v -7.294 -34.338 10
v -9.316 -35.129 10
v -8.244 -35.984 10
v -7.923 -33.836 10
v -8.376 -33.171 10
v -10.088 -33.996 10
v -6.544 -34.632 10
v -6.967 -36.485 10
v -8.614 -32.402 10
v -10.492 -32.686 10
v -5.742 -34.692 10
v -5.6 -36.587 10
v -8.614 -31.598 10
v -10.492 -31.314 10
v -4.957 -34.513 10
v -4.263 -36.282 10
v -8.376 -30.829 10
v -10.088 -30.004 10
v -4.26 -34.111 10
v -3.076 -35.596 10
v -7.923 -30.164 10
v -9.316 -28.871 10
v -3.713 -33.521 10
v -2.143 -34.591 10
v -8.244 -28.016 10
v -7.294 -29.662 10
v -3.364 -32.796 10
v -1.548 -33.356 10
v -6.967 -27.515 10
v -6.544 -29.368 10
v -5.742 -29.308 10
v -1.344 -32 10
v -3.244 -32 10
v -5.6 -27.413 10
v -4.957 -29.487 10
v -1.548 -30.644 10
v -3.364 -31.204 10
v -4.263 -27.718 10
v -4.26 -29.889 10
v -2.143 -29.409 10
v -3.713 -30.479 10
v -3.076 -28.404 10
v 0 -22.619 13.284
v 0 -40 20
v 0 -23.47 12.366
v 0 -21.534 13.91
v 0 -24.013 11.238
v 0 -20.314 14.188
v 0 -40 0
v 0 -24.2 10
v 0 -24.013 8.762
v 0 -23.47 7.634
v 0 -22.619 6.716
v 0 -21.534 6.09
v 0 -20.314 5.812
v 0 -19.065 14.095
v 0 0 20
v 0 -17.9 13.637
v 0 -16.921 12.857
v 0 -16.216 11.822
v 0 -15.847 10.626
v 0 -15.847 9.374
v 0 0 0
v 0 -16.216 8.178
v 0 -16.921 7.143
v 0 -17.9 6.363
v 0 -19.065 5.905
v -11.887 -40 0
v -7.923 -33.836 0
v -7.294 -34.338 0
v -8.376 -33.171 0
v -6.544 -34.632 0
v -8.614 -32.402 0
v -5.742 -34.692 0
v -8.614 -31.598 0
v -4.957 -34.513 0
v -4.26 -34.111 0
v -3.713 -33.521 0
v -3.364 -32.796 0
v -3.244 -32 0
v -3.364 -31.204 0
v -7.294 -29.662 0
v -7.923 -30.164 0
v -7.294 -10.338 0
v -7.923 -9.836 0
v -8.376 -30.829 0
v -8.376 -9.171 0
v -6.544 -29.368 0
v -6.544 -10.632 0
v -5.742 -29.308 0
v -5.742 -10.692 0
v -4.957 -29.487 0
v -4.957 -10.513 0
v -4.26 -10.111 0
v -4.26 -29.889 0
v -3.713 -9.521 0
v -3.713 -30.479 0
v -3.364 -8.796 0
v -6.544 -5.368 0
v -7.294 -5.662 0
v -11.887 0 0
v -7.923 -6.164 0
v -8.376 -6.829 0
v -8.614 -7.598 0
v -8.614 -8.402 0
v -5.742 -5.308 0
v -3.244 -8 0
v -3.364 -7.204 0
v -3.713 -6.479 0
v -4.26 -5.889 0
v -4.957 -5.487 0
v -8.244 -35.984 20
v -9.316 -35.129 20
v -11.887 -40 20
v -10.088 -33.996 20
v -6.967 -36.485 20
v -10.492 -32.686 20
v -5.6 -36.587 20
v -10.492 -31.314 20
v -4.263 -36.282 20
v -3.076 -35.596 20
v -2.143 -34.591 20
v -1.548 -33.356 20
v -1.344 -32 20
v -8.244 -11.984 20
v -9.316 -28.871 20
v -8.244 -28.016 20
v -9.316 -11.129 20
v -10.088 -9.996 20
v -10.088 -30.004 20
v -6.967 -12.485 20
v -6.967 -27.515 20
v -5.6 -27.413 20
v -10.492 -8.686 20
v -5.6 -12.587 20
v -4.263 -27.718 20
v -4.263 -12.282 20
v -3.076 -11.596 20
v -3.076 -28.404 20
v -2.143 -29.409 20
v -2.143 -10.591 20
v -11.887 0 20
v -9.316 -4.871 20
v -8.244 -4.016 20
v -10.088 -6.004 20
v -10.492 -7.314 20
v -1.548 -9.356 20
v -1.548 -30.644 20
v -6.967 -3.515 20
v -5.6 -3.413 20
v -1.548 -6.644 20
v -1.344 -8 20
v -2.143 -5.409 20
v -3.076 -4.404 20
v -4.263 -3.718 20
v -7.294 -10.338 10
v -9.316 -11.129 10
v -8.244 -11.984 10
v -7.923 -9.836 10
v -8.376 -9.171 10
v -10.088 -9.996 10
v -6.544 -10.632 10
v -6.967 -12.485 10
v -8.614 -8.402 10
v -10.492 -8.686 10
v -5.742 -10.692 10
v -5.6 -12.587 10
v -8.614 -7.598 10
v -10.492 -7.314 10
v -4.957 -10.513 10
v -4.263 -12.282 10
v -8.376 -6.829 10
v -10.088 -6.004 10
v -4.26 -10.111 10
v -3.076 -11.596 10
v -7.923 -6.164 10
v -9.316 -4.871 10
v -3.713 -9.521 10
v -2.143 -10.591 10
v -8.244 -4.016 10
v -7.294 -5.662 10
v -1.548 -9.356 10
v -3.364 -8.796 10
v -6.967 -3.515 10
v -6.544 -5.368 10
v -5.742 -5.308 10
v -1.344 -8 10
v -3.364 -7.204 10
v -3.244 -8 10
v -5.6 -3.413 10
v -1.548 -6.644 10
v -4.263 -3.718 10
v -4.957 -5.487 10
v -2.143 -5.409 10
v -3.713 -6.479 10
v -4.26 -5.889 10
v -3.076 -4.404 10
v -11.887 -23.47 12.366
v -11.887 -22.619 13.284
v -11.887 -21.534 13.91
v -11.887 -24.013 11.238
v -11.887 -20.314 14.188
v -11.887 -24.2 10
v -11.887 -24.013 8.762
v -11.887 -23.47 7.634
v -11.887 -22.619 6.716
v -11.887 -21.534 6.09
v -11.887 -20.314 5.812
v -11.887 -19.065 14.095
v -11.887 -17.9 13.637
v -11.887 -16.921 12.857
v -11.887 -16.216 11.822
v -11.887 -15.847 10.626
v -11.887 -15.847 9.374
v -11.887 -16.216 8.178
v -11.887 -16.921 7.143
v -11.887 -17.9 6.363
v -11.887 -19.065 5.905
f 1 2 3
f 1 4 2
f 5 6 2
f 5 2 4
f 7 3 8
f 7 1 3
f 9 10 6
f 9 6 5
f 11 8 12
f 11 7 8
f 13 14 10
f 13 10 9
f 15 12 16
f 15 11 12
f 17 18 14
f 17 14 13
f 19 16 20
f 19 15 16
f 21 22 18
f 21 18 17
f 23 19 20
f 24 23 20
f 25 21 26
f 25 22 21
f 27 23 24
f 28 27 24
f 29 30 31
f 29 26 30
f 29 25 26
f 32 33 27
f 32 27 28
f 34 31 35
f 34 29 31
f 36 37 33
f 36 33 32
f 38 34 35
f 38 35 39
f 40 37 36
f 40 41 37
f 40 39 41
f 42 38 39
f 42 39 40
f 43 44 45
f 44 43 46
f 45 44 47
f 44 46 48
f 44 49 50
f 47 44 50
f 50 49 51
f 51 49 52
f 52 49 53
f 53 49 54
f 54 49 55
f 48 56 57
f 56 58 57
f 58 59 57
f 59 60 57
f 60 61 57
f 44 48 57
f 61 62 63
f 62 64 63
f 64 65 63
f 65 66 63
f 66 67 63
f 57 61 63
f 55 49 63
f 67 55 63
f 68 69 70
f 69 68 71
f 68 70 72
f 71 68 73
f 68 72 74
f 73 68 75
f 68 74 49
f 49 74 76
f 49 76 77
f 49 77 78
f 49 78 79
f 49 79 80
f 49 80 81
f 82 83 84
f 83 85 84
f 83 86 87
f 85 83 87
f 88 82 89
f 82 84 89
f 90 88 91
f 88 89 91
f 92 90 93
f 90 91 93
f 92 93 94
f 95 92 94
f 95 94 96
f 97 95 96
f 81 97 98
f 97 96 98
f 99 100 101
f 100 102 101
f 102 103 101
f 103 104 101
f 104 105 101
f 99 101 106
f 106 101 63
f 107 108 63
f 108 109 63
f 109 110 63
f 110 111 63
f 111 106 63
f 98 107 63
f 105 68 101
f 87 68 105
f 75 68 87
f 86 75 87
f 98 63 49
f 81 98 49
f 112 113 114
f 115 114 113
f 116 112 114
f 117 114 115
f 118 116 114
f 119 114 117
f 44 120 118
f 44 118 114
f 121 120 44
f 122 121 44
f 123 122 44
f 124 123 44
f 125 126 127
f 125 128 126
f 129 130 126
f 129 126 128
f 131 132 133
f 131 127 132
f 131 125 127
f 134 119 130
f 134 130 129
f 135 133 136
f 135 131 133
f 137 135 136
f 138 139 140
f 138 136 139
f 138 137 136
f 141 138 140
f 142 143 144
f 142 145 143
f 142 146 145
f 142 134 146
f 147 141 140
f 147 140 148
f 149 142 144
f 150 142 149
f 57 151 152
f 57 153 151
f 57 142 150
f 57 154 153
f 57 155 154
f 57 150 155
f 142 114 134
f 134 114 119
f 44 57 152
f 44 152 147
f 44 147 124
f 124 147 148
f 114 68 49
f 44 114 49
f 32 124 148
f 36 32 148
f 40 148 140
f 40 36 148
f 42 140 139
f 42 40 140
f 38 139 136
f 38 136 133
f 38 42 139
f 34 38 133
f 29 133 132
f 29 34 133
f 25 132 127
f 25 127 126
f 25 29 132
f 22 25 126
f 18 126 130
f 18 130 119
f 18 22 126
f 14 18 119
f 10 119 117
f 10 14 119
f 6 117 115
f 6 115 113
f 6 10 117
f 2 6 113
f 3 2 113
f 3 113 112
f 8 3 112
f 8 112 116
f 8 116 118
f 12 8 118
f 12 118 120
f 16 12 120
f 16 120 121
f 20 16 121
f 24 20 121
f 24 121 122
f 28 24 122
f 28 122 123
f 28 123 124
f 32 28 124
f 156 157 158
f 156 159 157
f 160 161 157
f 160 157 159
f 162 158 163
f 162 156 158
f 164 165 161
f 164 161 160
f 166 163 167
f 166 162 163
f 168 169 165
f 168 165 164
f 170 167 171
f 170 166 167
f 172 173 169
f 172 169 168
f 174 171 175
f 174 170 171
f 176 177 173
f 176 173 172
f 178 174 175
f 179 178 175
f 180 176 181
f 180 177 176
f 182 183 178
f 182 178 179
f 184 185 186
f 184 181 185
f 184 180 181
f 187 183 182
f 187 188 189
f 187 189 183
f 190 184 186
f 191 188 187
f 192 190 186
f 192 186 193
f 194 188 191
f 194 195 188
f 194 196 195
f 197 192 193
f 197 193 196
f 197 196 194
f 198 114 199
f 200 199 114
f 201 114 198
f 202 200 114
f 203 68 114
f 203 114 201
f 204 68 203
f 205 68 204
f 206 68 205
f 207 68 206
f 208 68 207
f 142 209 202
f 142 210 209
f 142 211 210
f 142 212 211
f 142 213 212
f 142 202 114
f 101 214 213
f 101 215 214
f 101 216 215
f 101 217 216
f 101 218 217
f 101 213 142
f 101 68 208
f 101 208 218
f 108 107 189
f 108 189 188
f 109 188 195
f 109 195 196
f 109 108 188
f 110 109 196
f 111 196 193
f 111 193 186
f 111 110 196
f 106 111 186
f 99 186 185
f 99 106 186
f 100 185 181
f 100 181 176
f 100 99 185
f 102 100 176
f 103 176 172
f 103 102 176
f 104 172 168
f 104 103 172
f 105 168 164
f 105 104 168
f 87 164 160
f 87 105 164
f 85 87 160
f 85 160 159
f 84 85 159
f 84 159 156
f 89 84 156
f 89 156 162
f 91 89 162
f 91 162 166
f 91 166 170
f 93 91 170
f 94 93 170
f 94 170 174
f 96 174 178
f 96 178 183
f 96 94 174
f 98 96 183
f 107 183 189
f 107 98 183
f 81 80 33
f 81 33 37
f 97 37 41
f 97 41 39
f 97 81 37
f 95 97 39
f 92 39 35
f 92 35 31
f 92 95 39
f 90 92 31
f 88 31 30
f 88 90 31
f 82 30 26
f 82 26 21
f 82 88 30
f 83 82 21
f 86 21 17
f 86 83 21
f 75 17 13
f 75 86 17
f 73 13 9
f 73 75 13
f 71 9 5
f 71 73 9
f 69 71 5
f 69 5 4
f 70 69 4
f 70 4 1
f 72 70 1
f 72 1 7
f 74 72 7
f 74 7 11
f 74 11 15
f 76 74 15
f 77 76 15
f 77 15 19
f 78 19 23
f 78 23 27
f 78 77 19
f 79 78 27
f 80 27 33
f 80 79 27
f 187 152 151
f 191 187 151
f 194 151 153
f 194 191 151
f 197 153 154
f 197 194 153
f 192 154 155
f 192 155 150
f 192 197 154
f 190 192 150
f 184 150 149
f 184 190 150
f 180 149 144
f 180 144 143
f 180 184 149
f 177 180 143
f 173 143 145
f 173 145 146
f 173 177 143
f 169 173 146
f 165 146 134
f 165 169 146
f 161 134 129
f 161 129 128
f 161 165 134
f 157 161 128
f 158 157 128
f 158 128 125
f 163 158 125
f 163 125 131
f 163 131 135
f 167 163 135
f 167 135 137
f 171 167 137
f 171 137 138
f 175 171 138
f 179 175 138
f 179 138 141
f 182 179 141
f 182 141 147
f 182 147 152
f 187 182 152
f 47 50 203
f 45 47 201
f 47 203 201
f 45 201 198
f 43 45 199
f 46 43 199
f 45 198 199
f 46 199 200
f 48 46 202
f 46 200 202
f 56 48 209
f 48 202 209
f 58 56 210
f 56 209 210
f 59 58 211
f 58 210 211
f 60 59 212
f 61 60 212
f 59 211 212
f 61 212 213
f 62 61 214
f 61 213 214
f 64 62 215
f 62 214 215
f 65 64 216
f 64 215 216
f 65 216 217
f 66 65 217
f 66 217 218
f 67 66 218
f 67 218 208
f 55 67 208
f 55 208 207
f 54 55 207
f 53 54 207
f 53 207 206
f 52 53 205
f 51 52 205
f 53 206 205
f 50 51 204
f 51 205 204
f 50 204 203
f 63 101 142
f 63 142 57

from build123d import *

# Parameters (mm, degrees)
F0_W     = 11.887384
F0_H     = 40
F0_R     = 4.6
F1_DEPTH = 20
F0_R_2   = 2.7
F2_DEPTH = 10
F3_R     = 4.2
F4_DEPTH = 11.887384


with BuildPart() as f1:
    # F0 (on Top) → F1 (new body)
    with BuildSketch(Plane.XY):
        with Locations((-5.943692, -20)):
            Rectangle(F0_W, F0_H)
        with Locations((-5.943692, -32)):
            Circle(F0_R, mode=Mode.SUBTRACT)
        with Locations((-5.943692, -8)):
            Circle(F0_R, mode=Mode.SUBTRACT)
    extrude(amount=F1_DEPTH)

    # F0 (on Top) → F2 (join)
    with BuildSketch(Plane.XY):
        with Locations((-5.943692, -8)):
            Circle(F0_R)
        with Locations((-5.943692, -8)):
            Circle(F0_R_2, mode=Mode.SUBTRACT)
        with Locations((-5.943692, -32)):
            Circle(F0_R)
        with Locations((-5.943692, -32)):
            Circle(F0_R_2, mode=Mode.SUBTRACT)
    extrude(amount=F2_DEPTH)

    # F3 (on face) → F4 (cut, through all)
    with BuildSketch(Plane(origin=(-11.887384, 0, 0), x_dir=(0, -1, 0), z_dir=(-1, 0, 0))):
        with Locations((20, 10)):
            Circle(F3_R)
    extrude(amount=-F4_DEPTH, mode=Mode.SUBTRACT)


solid = f1.part
